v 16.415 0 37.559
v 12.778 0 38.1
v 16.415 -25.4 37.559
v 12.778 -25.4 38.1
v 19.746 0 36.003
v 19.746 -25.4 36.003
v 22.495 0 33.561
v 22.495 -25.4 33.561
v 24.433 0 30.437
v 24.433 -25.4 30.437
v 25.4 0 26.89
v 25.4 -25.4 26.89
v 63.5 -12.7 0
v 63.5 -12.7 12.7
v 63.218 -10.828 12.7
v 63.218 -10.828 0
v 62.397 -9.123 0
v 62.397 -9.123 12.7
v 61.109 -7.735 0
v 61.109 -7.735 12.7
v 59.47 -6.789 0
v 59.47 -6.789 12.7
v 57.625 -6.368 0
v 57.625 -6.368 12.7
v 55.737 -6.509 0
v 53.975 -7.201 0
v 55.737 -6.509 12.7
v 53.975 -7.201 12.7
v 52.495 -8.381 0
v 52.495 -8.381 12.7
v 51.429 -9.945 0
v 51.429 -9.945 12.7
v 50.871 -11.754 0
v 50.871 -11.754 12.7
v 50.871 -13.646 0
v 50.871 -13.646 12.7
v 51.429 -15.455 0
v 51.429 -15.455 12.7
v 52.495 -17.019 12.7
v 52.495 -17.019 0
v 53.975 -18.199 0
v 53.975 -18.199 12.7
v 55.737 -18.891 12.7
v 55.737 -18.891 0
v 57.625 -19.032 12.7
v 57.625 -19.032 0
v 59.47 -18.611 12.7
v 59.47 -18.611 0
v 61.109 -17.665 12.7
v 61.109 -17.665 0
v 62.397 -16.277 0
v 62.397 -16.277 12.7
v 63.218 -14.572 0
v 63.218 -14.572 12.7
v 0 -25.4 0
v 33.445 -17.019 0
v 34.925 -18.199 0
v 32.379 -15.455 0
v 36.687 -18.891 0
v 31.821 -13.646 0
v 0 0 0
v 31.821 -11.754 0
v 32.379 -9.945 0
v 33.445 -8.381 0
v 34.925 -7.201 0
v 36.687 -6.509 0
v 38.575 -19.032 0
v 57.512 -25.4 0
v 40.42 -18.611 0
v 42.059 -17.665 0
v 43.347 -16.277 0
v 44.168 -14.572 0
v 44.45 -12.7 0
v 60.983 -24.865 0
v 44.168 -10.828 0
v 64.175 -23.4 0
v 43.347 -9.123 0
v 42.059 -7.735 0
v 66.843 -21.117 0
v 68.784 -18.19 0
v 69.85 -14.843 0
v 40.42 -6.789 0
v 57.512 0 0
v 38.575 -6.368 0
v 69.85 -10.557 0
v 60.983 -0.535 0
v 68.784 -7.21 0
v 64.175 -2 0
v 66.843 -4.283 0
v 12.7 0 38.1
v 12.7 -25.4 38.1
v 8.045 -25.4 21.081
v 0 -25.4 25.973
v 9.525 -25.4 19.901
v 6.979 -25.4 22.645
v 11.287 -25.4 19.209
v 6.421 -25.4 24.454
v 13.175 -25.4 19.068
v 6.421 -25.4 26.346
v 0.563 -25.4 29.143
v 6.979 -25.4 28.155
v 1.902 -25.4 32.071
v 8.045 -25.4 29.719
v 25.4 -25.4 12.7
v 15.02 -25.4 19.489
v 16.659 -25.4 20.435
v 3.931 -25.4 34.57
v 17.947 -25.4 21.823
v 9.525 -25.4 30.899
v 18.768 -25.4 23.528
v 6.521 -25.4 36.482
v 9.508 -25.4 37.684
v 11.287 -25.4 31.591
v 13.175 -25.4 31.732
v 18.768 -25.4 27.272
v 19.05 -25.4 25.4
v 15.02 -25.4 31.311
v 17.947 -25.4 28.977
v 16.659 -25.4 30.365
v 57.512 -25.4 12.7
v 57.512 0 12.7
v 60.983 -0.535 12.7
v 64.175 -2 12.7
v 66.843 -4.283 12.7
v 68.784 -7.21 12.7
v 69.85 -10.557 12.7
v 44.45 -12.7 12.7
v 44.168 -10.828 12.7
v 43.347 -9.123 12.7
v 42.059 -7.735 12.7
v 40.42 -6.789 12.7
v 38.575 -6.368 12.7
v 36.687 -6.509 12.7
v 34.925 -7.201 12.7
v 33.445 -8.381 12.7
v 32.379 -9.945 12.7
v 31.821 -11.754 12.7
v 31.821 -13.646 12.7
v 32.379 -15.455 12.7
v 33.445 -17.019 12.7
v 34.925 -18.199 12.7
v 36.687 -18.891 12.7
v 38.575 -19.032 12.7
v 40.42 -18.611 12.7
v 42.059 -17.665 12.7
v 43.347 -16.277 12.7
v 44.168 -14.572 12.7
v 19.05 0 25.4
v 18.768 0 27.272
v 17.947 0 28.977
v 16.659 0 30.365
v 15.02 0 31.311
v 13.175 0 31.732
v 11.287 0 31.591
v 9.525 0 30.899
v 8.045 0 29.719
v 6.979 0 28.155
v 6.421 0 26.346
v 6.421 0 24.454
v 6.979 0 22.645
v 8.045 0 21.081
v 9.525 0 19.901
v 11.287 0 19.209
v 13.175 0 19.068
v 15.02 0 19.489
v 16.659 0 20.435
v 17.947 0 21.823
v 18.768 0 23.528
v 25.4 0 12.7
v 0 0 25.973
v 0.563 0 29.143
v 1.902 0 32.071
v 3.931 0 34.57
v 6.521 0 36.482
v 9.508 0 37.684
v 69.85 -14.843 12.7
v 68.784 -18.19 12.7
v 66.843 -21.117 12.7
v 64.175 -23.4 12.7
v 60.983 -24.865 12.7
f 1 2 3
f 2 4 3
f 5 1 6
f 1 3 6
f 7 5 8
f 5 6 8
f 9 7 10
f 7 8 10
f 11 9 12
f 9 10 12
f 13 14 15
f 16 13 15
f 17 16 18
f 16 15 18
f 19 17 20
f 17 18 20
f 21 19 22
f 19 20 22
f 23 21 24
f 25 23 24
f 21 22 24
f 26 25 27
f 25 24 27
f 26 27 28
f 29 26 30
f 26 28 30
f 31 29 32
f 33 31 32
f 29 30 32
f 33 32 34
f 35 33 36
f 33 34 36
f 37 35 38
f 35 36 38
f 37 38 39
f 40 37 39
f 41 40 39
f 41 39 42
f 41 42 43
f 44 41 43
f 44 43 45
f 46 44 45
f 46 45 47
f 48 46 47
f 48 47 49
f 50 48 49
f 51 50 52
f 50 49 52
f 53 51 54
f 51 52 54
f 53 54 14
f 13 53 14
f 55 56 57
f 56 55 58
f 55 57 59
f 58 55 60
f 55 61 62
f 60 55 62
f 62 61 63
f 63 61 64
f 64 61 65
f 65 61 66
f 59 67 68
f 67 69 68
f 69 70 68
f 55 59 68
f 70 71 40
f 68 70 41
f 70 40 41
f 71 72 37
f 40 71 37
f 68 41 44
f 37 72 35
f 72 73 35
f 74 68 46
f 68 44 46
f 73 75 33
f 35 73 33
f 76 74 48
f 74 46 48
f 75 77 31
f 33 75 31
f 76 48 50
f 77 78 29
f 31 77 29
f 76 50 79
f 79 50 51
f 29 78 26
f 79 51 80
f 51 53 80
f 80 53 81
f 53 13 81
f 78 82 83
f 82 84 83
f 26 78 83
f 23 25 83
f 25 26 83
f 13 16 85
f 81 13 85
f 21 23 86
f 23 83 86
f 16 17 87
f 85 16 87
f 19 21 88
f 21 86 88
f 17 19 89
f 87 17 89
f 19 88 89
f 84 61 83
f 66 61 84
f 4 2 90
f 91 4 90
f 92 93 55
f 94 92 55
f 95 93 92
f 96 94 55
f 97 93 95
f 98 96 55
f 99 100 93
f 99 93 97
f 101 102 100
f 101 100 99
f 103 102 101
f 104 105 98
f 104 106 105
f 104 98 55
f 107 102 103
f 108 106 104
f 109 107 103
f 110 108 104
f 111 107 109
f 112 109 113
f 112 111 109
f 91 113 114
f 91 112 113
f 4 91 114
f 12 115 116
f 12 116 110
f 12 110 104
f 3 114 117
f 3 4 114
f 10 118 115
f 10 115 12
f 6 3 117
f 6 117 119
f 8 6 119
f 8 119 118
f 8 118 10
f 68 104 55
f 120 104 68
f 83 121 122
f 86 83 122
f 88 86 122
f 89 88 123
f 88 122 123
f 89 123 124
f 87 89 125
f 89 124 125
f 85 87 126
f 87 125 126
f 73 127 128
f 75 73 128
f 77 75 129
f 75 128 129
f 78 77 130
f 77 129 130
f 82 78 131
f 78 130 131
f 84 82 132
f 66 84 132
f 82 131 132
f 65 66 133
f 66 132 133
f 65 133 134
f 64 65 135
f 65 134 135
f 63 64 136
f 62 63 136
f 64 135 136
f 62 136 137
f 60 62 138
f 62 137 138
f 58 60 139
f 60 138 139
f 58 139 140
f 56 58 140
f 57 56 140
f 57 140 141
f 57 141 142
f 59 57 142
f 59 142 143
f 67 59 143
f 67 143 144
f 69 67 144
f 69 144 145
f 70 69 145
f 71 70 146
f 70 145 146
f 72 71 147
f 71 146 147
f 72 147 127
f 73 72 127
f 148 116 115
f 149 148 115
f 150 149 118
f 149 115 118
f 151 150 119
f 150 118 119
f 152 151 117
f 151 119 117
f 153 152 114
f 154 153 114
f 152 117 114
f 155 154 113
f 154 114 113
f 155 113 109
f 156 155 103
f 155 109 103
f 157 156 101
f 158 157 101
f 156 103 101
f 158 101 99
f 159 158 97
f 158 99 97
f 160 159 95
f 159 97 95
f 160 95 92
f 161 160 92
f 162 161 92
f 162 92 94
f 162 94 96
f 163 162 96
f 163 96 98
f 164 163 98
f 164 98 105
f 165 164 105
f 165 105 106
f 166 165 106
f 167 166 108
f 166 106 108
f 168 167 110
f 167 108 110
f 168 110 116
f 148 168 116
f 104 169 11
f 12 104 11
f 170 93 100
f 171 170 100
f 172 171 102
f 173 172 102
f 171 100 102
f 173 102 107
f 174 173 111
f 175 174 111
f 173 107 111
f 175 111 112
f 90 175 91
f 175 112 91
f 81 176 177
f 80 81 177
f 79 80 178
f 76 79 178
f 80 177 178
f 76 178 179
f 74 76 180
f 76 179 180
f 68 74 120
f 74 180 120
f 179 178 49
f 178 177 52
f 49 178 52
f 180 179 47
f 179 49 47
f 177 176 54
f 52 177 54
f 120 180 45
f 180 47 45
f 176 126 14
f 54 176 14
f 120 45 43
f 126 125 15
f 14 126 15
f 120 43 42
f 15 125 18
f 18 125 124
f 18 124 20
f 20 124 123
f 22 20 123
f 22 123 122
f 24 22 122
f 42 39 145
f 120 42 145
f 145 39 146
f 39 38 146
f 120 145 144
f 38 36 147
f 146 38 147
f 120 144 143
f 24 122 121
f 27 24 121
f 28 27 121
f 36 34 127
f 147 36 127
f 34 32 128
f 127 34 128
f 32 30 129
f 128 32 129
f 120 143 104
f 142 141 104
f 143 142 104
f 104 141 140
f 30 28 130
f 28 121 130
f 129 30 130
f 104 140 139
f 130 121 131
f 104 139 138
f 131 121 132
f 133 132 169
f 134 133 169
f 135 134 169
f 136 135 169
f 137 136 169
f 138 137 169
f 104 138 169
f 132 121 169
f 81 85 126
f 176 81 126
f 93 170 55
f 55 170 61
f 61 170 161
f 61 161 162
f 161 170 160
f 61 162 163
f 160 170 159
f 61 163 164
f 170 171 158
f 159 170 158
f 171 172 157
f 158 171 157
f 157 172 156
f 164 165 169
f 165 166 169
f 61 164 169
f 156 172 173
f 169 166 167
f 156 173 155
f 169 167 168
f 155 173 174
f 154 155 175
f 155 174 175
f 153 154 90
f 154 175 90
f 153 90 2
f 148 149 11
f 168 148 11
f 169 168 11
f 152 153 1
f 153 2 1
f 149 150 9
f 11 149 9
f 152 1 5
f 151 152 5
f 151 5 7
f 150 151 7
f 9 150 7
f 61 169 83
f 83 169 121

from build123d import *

# Parameters (mm, degrees)
F1_DEPTH = 25.4
F2_R     = 6.35
F3_DEPTH = 25.4
F4_R     = 6.35
F5_DEPTH = 12.7


# Not quite as in the source:
# - ends of sketch curves that miss each other by under 0.0002 mm in the source are joined


with BuildPart() as f1:
    # F0 (on Front) → F1 (new body)
    with BuildSketch(Plane.XZ):
        Polygon((0, 38.1), (0, 0), (69.85, 0), (69.85, 12.7), (25.3999973736, 12.7), (25.3999973736, 38.1), align=None)
    extrude(amount=F1_DEPTH)

    # F2 (on face) → F3 (cut)
    with BuildSketch(Plane.XZ.offset(25.4)):
        with Locations((12.7, 25.4)):
            Circle(F2_R)
        with BuildLine():
            ThreePointArc((12.7392116615, 38.1000602784), (21.1944094362, 34.8947951162), (25.3999973736, 26.8899763006))
            Line((25.3999973736, 26.8899763006), (25.3999973736, 38.1))
            Line((25.3999973736, 38.1), (12.7392116615, 38.1000602784))
        make_face()
        with BuildLine():
            ThreePointArc((0, 25.9728431702), (3.9449392563, 34.5834780061), (12.7392116615, 38.1000602784))
            Line((12.7392116615, 38.1000602784), (0, 38.1))
            Line((0, 38.1), (0, 25.9728431702))
        make_face()
    extrude(amount=-F3_DEPTH, mode=Mode.SUBTRACT)

    # F4 (on face) → F5 (cut)
    with BuildSketch(Plane.XY.offset(12.7)):
        with Locations((38.1, -12.7)):
            Circle(F4_R)
        with Locations((57.15, -12.7)):
            Circle(F4_R)
        with BuildLine():
            ThreePointArc((57.5116686145, 0), (65.5882036204, -3.0491682704), (69.85, -10.5568267911))
            Line((69.85, -10.5568267911), (69.85, 0))
            Line((69.85, 0), (57.5116686145, 0))
        make_face()
        with BuildLine():
            ThreePointArc((69.85, -14.8431732089), (65.5882036204, -22.3508317296), (57.5116686145, -25.4))
            Line((57.5116686145, -25.4), (69.85, -25.4))
            Line((69.85, -25.4), (69.85, -14.8431732089))
        make_face()
    extrude(amount=-F5_DEPTH, mode=Mode.SUBTRACT)


solid = f1.part
